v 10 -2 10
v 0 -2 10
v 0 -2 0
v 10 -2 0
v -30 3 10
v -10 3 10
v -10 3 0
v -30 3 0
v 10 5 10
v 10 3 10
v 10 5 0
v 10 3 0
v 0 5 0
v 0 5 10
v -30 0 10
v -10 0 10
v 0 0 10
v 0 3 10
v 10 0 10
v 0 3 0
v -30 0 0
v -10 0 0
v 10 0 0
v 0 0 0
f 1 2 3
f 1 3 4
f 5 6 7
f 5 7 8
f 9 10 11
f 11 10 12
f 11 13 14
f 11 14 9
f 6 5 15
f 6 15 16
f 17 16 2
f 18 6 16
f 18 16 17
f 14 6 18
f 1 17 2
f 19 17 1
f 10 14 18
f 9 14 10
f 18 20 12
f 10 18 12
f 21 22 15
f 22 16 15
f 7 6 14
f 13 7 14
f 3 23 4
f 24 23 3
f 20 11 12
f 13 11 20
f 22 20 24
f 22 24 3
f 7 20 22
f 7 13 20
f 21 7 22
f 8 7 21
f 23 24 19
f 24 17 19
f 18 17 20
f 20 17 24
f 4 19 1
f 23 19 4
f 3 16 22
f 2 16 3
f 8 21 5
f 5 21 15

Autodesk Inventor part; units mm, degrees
ref_plane "YZ Plane" through (0, 0, 0) normal (1, 0, 0) x (0, 1, 0)
ref_plane "XZ Plane" through (0, 0, 0) normal (0, 1, 0) x (-1, 0, 0)
ref_plane "XY Plane" through (0, 0, 0) normal (0, 0, 1) x (1, 0, 0)
sketch "Sketch1" plane through (0, 0, 0) normal (0, 1, 0) x (-1, 0, 0)
  line L0 (0, 0) -> (30, 0)
  line L1 (30, 0) -> (30, 10)
  line L2 (30, 10) -> (0, 10)
  line L3 (0, 10) -> (0, 0)
  dimension "d0" = 30
  dimension "d1" = 10
extrude "Extrusion1" add sketch "Sketch1" along normal blind 3
sketch "Sketch2" plane through (0, 3, 0) normal (0, 1, 0) x (1, 0, 0)
  line L0 (-30, -10) -> (0, -10) projected
  line L1 (-10, -10) -> (10, -10)
  line L2 (10, -10) -> (10, 0)
  line L3 (10, 0) -> (-10, 0)
  line L4 (-10, 0) -> (-10, -10)
  line L5 (0, -10) -> (0, 0) projected
  dimension "d4" = 10
  dimension "d5" = 10
  dimension "d6" = 20
extrude "Extrusion2" add sketch "Sketch2" along normal blind 2
sketch "Sketch3" plane through (0, 0, 0) normal (0, -1, 0) x (1, 0, 0)
  line L0 (-10, 10) -> (10, 10) projected
  line L1 (10, 0) -> (0, 0) projected
  line L2 (-10, 10) -> (10, 10)
  line L3 (10, 10) -> (10, 0)
  line L4 (10, 0) -> (-10, 0)
  line L5 (-10, 0) -> (-10, 10)
extrude "Extrusion3" add sketch "Sketch3" along normal blind 2
sketch "Sketch4" plane through (-30, 0, 10) normal (0, 0, 1) x (1, 0, 0)
  line L0 (20, 0) -> (20, -2) projected
  line L1 (20, 0) -> (30, -2)
  line L2 (40, -2) -> (20, -2) projected
  line L3 (0, 3) -> (20, 3) projected
  line L4 (20, 3) -> (30, 5)
  line L5 (20, 5) -> (40, 5) projected
  line L6 (30, 3) -> (30, 5)
  line L7 (30, 3) -> (20, 3)
  line L8 (30, 0) -> (30, 3) projected
  line L9 (30, -2) -> (30, 0)
  line L10 (30, 0) -> (20, 0)
  line L11 (20, 3) -> (20, 5) projected
  line L12 (20, 3) -> (20, 5)
  line L13 (20, 5) -> (30, 5)
  line L14 (30, -2) -> (20, -2)
  line L15 (20, -2) -> (20, 0)
extrude "Extrusion4" cut sketch "Sketch4" against normal through all contours L1 L2 L0 | L4 L11 L5
properties part number "MotorHållare"
